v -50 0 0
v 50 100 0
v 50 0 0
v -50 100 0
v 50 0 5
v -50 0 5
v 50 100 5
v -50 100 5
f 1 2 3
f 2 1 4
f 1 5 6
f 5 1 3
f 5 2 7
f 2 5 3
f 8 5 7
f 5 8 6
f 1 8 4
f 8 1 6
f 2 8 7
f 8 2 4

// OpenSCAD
// file: ../cuts/leftright.scad
module LeftRight( apart, minX, maxX, minY, maxY, minZ, maxZ, y, play ) {
    yy = len(y) == 0 ? [ minY : ( maxY - minY ) / 10 : maxY ] : y;

    translate( [ apart/2, 0, 0 ] )
    Right( minX=minX, maxX=maxX, minY=minY, maxY=maxY, minZ=minZ, maxZ=maxZ, y=yy, play=play ) {
        children(0);
        children(1);
    };

    translate( [ -apart/2, 0, 0 ] )
    Left( minX=minX, maxX=maxX, minY=minY, maxY=maxY, minZ=minZ, maxZ=maxZ, y=yy, play=play ) {
        children(0);
        children(1);
    };
};

module Right( minX, maxX, minY, maxY, minZ, maxZ, y, play ) {
    difference() {
        intersection() {
            children(0);
            translate( [ 0, minY, minZ ] ) {
                cube( [ maxX, maxY - minY, maxZ - minZ ] );
            }
        };

        for( yy=y ) {
            translate( [ 0, yy, minZ ] ) {
                minkowski() {
                    linear_extrude( height = maxZ - minZ ) {
                        children(1);
                    };
                    sphere( r=play );
                }
            }
        }
    }
}

module Left( minX, maxX, minY, maxY, minZ, maxZ, y, play ) {
    difference() {
        children(0);
        difference() {
            translate( [ 0, minY, minZ ] ) {
                cube( [ maxX, maxY - minY, maxZ - minZ ] );
            };

            for( yy=y ) {
                translate( [ 0, yy, minZ ] ) {
                    linear_extrude( height = maxZ - minZ ) {
                        children(1);
                    }
                }
            }
        }
    }
}
// main file
//
// Cut a cube with a comb that has rounded corners.
//

use <../cuts/leftright.scad>

module MyPart() {
    translate( [ -50, 0, 0 ] ) {
        cube( [ 100, 100, 5 ] );
    }
}

LeftRight() {
    MyPart();

    translate( [ 0, -3, 0, ] )
    minkowski() {
        square( size = [ 6, 6 ] );
        circle( r=2 );
    };
}
